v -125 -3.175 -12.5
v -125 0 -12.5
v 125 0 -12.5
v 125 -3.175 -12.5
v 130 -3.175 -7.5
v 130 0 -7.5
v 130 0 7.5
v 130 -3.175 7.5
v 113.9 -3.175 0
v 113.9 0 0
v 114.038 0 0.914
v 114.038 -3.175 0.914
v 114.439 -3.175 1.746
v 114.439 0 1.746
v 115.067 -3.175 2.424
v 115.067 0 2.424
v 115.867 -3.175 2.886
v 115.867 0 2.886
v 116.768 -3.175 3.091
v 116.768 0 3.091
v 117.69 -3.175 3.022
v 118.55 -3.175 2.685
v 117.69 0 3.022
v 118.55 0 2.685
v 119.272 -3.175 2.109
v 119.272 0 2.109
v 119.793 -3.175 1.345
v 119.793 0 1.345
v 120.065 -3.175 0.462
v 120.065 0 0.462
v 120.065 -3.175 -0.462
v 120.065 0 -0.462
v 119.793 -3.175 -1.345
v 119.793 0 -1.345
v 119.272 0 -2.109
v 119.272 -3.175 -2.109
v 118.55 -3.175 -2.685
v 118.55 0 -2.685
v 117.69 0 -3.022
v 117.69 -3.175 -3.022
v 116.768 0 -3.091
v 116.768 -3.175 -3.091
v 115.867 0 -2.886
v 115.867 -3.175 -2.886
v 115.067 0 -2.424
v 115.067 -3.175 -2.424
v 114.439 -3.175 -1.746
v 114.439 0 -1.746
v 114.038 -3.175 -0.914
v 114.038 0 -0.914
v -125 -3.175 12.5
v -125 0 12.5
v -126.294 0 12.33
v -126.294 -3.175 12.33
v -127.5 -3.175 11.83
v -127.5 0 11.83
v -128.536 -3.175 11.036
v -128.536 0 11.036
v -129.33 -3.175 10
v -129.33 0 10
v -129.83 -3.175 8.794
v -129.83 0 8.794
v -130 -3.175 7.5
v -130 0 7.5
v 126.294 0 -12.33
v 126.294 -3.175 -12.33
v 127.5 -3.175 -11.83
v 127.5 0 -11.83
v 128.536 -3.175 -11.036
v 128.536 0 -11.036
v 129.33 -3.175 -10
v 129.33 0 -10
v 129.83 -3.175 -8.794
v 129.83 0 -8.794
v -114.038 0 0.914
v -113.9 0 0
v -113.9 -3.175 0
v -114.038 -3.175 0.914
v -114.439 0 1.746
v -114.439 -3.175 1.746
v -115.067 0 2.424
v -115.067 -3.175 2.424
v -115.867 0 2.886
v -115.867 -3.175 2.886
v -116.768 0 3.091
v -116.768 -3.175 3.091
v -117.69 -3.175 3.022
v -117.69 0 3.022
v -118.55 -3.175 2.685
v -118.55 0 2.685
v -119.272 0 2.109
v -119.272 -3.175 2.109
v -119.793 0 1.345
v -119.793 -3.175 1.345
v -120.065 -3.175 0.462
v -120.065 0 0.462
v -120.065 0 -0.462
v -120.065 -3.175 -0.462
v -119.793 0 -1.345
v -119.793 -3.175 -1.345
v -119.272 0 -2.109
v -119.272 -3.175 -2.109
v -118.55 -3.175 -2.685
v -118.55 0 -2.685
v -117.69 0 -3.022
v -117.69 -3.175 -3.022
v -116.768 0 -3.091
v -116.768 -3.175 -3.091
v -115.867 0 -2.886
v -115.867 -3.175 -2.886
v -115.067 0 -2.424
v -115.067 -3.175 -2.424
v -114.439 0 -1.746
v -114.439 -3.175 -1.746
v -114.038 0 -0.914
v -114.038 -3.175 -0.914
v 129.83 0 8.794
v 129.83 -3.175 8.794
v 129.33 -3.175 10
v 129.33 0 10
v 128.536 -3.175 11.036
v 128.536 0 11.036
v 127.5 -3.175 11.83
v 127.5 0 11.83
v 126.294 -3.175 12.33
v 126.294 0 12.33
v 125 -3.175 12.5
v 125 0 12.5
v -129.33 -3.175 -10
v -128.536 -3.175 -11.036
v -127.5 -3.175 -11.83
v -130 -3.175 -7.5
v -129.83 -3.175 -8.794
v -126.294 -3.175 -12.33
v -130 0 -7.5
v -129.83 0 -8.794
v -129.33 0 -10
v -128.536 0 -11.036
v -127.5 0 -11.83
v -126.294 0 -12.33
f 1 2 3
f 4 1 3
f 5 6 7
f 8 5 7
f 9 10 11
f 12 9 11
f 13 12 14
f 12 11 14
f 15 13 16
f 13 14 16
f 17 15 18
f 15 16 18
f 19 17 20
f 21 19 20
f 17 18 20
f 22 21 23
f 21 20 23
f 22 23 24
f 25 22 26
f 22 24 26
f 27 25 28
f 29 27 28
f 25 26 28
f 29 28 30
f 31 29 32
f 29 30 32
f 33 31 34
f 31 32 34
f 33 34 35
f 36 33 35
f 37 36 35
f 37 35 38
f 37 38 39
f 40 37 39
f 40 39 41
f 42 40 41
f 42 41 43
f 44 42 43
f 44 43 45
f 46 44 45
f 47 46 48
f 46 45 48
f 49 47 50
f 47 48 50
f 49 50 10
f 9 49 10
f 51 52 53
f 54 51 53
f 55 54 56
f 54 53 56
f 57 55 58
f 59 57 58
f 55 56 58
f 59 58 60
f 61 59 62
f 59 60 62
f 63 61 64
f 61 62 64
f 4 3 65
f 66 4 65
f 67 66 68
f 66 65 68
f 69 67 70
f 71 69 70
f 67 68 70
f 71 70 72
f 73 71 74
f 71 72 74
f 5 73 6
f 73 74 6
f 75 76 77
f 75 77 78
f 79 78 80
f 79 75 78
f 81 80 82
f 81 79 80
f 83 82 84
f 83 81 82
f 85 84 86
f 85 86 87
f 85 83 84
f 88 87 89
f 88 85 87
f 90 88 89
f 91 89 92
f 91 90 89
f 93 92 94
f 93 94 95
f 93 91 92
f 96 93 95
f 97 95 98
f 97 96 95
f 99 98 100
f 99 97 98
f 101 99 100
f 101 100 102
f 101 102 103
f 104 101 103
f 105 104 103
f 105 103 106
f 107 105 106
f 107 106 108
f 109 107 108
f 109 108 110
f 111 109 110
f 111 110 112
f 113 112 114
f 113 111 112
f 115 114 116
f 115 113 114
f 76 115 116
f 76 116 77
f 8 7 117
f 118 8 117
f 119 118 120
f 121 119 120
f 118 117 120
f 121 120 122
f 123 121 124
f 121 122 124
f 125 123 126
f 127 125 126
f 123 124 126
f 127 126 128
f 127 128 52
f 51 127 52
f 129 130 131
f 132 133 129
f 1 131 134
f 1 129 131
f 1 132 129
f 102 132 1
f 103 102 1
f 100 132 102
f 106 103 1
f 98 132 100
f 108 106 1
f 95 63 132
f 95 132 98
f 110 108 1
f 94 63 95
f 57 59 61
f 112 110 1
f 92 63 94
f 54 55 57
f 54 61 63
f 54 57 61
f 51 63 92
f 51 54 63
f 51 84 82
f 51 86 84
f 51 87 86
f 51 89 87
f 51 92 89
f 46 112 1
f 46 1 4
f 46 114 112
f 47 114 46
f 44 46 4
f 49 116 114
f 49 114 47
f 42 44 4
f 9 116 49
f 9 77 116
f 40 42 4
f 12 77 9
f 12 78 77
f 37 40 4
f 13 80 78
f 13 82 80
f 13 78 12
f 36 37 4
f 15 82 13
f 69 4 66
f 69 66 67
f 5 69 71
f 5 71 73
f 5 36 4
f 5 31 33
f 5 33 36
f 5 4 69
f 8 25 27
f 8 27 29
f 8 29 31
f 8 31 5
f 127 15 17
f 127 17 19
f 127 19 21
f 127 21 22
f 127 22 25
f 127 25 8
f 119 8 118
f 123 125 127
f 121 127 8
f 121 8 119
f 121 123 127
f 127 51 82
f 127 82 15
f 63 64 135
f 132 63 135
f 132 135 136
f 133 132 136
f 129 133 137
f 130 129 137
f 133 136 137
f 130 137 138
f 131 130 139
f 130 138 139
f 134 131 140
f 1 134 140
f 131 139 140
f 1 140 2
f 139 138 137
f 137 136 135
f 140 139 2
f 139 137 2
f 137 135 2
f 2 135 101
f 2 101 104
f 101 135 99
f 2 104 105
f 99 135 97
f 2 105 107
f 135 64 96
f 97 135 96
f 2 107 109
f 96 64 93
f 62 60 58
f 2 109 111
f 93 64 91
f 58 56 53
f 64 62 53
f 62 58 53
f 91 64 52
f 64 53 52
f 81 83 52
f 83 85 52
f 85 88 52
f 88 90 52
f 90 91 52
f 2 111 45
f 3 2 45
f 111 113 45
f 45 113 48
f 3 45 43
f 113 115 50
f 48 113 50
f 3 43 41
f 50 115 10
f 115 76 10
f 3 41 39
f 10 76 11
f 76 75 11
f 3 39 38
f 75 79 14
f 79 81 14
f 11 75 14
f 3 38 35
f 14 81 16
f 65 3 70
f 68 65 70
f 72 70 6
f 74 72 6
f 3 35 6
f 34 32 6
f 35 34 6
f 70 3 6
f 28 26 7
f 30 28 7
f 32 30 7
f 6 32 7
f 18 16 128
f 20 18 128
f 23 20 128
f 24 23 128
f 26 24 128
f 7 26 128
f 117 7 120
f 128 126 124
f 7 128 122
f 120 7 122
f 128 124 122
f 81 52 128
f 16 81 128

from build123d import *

# Parameters (mm, degrees)
F0_R     = 3.1
F1_DEPTH = 3.175


with BuildPart() as f1:
    # F0 (on Front) → F1 (new body)
    with BuildSketch(Plane.XZ):
        with BuildLine():
            Line((125, 12.5), (-125, 12.5))
            ThreePointArc((-125, 12.5), (-128.535534, 11.035534), (-130, 7.5))
            Line((-130, 7.5), (-130, -7.5))
            ThreePointArc((-130, -7.5), (-128.535534, -11.035534), (-125, -12.5))
            Line((-125, -12.5), (125, -12.5))
            ThreePointArc((125, -12.5), (128.535534, -11.035534), (130, -7.5))
            Line((130, -7.5), (130, 7.5))
            ThreePointArc((130, 7.5), (128.535534, 11.035534), (125, 12.5))
        make_face()
        with Locations((-117, 0)):
            Circle(F0_R, mode=Mode.SUBTRACT)
        with BuildLine():
            ThreePointArc((120.1, 0), (117, -3.1), (113.9, 0))
            ThreePointArc((113.9, 0), (117, 3.1), (120.1, 0))
        make_face(mode=Mode.SUBTRACT)
    extrude(amount=F1_DEPTH)


solid = f1.part
